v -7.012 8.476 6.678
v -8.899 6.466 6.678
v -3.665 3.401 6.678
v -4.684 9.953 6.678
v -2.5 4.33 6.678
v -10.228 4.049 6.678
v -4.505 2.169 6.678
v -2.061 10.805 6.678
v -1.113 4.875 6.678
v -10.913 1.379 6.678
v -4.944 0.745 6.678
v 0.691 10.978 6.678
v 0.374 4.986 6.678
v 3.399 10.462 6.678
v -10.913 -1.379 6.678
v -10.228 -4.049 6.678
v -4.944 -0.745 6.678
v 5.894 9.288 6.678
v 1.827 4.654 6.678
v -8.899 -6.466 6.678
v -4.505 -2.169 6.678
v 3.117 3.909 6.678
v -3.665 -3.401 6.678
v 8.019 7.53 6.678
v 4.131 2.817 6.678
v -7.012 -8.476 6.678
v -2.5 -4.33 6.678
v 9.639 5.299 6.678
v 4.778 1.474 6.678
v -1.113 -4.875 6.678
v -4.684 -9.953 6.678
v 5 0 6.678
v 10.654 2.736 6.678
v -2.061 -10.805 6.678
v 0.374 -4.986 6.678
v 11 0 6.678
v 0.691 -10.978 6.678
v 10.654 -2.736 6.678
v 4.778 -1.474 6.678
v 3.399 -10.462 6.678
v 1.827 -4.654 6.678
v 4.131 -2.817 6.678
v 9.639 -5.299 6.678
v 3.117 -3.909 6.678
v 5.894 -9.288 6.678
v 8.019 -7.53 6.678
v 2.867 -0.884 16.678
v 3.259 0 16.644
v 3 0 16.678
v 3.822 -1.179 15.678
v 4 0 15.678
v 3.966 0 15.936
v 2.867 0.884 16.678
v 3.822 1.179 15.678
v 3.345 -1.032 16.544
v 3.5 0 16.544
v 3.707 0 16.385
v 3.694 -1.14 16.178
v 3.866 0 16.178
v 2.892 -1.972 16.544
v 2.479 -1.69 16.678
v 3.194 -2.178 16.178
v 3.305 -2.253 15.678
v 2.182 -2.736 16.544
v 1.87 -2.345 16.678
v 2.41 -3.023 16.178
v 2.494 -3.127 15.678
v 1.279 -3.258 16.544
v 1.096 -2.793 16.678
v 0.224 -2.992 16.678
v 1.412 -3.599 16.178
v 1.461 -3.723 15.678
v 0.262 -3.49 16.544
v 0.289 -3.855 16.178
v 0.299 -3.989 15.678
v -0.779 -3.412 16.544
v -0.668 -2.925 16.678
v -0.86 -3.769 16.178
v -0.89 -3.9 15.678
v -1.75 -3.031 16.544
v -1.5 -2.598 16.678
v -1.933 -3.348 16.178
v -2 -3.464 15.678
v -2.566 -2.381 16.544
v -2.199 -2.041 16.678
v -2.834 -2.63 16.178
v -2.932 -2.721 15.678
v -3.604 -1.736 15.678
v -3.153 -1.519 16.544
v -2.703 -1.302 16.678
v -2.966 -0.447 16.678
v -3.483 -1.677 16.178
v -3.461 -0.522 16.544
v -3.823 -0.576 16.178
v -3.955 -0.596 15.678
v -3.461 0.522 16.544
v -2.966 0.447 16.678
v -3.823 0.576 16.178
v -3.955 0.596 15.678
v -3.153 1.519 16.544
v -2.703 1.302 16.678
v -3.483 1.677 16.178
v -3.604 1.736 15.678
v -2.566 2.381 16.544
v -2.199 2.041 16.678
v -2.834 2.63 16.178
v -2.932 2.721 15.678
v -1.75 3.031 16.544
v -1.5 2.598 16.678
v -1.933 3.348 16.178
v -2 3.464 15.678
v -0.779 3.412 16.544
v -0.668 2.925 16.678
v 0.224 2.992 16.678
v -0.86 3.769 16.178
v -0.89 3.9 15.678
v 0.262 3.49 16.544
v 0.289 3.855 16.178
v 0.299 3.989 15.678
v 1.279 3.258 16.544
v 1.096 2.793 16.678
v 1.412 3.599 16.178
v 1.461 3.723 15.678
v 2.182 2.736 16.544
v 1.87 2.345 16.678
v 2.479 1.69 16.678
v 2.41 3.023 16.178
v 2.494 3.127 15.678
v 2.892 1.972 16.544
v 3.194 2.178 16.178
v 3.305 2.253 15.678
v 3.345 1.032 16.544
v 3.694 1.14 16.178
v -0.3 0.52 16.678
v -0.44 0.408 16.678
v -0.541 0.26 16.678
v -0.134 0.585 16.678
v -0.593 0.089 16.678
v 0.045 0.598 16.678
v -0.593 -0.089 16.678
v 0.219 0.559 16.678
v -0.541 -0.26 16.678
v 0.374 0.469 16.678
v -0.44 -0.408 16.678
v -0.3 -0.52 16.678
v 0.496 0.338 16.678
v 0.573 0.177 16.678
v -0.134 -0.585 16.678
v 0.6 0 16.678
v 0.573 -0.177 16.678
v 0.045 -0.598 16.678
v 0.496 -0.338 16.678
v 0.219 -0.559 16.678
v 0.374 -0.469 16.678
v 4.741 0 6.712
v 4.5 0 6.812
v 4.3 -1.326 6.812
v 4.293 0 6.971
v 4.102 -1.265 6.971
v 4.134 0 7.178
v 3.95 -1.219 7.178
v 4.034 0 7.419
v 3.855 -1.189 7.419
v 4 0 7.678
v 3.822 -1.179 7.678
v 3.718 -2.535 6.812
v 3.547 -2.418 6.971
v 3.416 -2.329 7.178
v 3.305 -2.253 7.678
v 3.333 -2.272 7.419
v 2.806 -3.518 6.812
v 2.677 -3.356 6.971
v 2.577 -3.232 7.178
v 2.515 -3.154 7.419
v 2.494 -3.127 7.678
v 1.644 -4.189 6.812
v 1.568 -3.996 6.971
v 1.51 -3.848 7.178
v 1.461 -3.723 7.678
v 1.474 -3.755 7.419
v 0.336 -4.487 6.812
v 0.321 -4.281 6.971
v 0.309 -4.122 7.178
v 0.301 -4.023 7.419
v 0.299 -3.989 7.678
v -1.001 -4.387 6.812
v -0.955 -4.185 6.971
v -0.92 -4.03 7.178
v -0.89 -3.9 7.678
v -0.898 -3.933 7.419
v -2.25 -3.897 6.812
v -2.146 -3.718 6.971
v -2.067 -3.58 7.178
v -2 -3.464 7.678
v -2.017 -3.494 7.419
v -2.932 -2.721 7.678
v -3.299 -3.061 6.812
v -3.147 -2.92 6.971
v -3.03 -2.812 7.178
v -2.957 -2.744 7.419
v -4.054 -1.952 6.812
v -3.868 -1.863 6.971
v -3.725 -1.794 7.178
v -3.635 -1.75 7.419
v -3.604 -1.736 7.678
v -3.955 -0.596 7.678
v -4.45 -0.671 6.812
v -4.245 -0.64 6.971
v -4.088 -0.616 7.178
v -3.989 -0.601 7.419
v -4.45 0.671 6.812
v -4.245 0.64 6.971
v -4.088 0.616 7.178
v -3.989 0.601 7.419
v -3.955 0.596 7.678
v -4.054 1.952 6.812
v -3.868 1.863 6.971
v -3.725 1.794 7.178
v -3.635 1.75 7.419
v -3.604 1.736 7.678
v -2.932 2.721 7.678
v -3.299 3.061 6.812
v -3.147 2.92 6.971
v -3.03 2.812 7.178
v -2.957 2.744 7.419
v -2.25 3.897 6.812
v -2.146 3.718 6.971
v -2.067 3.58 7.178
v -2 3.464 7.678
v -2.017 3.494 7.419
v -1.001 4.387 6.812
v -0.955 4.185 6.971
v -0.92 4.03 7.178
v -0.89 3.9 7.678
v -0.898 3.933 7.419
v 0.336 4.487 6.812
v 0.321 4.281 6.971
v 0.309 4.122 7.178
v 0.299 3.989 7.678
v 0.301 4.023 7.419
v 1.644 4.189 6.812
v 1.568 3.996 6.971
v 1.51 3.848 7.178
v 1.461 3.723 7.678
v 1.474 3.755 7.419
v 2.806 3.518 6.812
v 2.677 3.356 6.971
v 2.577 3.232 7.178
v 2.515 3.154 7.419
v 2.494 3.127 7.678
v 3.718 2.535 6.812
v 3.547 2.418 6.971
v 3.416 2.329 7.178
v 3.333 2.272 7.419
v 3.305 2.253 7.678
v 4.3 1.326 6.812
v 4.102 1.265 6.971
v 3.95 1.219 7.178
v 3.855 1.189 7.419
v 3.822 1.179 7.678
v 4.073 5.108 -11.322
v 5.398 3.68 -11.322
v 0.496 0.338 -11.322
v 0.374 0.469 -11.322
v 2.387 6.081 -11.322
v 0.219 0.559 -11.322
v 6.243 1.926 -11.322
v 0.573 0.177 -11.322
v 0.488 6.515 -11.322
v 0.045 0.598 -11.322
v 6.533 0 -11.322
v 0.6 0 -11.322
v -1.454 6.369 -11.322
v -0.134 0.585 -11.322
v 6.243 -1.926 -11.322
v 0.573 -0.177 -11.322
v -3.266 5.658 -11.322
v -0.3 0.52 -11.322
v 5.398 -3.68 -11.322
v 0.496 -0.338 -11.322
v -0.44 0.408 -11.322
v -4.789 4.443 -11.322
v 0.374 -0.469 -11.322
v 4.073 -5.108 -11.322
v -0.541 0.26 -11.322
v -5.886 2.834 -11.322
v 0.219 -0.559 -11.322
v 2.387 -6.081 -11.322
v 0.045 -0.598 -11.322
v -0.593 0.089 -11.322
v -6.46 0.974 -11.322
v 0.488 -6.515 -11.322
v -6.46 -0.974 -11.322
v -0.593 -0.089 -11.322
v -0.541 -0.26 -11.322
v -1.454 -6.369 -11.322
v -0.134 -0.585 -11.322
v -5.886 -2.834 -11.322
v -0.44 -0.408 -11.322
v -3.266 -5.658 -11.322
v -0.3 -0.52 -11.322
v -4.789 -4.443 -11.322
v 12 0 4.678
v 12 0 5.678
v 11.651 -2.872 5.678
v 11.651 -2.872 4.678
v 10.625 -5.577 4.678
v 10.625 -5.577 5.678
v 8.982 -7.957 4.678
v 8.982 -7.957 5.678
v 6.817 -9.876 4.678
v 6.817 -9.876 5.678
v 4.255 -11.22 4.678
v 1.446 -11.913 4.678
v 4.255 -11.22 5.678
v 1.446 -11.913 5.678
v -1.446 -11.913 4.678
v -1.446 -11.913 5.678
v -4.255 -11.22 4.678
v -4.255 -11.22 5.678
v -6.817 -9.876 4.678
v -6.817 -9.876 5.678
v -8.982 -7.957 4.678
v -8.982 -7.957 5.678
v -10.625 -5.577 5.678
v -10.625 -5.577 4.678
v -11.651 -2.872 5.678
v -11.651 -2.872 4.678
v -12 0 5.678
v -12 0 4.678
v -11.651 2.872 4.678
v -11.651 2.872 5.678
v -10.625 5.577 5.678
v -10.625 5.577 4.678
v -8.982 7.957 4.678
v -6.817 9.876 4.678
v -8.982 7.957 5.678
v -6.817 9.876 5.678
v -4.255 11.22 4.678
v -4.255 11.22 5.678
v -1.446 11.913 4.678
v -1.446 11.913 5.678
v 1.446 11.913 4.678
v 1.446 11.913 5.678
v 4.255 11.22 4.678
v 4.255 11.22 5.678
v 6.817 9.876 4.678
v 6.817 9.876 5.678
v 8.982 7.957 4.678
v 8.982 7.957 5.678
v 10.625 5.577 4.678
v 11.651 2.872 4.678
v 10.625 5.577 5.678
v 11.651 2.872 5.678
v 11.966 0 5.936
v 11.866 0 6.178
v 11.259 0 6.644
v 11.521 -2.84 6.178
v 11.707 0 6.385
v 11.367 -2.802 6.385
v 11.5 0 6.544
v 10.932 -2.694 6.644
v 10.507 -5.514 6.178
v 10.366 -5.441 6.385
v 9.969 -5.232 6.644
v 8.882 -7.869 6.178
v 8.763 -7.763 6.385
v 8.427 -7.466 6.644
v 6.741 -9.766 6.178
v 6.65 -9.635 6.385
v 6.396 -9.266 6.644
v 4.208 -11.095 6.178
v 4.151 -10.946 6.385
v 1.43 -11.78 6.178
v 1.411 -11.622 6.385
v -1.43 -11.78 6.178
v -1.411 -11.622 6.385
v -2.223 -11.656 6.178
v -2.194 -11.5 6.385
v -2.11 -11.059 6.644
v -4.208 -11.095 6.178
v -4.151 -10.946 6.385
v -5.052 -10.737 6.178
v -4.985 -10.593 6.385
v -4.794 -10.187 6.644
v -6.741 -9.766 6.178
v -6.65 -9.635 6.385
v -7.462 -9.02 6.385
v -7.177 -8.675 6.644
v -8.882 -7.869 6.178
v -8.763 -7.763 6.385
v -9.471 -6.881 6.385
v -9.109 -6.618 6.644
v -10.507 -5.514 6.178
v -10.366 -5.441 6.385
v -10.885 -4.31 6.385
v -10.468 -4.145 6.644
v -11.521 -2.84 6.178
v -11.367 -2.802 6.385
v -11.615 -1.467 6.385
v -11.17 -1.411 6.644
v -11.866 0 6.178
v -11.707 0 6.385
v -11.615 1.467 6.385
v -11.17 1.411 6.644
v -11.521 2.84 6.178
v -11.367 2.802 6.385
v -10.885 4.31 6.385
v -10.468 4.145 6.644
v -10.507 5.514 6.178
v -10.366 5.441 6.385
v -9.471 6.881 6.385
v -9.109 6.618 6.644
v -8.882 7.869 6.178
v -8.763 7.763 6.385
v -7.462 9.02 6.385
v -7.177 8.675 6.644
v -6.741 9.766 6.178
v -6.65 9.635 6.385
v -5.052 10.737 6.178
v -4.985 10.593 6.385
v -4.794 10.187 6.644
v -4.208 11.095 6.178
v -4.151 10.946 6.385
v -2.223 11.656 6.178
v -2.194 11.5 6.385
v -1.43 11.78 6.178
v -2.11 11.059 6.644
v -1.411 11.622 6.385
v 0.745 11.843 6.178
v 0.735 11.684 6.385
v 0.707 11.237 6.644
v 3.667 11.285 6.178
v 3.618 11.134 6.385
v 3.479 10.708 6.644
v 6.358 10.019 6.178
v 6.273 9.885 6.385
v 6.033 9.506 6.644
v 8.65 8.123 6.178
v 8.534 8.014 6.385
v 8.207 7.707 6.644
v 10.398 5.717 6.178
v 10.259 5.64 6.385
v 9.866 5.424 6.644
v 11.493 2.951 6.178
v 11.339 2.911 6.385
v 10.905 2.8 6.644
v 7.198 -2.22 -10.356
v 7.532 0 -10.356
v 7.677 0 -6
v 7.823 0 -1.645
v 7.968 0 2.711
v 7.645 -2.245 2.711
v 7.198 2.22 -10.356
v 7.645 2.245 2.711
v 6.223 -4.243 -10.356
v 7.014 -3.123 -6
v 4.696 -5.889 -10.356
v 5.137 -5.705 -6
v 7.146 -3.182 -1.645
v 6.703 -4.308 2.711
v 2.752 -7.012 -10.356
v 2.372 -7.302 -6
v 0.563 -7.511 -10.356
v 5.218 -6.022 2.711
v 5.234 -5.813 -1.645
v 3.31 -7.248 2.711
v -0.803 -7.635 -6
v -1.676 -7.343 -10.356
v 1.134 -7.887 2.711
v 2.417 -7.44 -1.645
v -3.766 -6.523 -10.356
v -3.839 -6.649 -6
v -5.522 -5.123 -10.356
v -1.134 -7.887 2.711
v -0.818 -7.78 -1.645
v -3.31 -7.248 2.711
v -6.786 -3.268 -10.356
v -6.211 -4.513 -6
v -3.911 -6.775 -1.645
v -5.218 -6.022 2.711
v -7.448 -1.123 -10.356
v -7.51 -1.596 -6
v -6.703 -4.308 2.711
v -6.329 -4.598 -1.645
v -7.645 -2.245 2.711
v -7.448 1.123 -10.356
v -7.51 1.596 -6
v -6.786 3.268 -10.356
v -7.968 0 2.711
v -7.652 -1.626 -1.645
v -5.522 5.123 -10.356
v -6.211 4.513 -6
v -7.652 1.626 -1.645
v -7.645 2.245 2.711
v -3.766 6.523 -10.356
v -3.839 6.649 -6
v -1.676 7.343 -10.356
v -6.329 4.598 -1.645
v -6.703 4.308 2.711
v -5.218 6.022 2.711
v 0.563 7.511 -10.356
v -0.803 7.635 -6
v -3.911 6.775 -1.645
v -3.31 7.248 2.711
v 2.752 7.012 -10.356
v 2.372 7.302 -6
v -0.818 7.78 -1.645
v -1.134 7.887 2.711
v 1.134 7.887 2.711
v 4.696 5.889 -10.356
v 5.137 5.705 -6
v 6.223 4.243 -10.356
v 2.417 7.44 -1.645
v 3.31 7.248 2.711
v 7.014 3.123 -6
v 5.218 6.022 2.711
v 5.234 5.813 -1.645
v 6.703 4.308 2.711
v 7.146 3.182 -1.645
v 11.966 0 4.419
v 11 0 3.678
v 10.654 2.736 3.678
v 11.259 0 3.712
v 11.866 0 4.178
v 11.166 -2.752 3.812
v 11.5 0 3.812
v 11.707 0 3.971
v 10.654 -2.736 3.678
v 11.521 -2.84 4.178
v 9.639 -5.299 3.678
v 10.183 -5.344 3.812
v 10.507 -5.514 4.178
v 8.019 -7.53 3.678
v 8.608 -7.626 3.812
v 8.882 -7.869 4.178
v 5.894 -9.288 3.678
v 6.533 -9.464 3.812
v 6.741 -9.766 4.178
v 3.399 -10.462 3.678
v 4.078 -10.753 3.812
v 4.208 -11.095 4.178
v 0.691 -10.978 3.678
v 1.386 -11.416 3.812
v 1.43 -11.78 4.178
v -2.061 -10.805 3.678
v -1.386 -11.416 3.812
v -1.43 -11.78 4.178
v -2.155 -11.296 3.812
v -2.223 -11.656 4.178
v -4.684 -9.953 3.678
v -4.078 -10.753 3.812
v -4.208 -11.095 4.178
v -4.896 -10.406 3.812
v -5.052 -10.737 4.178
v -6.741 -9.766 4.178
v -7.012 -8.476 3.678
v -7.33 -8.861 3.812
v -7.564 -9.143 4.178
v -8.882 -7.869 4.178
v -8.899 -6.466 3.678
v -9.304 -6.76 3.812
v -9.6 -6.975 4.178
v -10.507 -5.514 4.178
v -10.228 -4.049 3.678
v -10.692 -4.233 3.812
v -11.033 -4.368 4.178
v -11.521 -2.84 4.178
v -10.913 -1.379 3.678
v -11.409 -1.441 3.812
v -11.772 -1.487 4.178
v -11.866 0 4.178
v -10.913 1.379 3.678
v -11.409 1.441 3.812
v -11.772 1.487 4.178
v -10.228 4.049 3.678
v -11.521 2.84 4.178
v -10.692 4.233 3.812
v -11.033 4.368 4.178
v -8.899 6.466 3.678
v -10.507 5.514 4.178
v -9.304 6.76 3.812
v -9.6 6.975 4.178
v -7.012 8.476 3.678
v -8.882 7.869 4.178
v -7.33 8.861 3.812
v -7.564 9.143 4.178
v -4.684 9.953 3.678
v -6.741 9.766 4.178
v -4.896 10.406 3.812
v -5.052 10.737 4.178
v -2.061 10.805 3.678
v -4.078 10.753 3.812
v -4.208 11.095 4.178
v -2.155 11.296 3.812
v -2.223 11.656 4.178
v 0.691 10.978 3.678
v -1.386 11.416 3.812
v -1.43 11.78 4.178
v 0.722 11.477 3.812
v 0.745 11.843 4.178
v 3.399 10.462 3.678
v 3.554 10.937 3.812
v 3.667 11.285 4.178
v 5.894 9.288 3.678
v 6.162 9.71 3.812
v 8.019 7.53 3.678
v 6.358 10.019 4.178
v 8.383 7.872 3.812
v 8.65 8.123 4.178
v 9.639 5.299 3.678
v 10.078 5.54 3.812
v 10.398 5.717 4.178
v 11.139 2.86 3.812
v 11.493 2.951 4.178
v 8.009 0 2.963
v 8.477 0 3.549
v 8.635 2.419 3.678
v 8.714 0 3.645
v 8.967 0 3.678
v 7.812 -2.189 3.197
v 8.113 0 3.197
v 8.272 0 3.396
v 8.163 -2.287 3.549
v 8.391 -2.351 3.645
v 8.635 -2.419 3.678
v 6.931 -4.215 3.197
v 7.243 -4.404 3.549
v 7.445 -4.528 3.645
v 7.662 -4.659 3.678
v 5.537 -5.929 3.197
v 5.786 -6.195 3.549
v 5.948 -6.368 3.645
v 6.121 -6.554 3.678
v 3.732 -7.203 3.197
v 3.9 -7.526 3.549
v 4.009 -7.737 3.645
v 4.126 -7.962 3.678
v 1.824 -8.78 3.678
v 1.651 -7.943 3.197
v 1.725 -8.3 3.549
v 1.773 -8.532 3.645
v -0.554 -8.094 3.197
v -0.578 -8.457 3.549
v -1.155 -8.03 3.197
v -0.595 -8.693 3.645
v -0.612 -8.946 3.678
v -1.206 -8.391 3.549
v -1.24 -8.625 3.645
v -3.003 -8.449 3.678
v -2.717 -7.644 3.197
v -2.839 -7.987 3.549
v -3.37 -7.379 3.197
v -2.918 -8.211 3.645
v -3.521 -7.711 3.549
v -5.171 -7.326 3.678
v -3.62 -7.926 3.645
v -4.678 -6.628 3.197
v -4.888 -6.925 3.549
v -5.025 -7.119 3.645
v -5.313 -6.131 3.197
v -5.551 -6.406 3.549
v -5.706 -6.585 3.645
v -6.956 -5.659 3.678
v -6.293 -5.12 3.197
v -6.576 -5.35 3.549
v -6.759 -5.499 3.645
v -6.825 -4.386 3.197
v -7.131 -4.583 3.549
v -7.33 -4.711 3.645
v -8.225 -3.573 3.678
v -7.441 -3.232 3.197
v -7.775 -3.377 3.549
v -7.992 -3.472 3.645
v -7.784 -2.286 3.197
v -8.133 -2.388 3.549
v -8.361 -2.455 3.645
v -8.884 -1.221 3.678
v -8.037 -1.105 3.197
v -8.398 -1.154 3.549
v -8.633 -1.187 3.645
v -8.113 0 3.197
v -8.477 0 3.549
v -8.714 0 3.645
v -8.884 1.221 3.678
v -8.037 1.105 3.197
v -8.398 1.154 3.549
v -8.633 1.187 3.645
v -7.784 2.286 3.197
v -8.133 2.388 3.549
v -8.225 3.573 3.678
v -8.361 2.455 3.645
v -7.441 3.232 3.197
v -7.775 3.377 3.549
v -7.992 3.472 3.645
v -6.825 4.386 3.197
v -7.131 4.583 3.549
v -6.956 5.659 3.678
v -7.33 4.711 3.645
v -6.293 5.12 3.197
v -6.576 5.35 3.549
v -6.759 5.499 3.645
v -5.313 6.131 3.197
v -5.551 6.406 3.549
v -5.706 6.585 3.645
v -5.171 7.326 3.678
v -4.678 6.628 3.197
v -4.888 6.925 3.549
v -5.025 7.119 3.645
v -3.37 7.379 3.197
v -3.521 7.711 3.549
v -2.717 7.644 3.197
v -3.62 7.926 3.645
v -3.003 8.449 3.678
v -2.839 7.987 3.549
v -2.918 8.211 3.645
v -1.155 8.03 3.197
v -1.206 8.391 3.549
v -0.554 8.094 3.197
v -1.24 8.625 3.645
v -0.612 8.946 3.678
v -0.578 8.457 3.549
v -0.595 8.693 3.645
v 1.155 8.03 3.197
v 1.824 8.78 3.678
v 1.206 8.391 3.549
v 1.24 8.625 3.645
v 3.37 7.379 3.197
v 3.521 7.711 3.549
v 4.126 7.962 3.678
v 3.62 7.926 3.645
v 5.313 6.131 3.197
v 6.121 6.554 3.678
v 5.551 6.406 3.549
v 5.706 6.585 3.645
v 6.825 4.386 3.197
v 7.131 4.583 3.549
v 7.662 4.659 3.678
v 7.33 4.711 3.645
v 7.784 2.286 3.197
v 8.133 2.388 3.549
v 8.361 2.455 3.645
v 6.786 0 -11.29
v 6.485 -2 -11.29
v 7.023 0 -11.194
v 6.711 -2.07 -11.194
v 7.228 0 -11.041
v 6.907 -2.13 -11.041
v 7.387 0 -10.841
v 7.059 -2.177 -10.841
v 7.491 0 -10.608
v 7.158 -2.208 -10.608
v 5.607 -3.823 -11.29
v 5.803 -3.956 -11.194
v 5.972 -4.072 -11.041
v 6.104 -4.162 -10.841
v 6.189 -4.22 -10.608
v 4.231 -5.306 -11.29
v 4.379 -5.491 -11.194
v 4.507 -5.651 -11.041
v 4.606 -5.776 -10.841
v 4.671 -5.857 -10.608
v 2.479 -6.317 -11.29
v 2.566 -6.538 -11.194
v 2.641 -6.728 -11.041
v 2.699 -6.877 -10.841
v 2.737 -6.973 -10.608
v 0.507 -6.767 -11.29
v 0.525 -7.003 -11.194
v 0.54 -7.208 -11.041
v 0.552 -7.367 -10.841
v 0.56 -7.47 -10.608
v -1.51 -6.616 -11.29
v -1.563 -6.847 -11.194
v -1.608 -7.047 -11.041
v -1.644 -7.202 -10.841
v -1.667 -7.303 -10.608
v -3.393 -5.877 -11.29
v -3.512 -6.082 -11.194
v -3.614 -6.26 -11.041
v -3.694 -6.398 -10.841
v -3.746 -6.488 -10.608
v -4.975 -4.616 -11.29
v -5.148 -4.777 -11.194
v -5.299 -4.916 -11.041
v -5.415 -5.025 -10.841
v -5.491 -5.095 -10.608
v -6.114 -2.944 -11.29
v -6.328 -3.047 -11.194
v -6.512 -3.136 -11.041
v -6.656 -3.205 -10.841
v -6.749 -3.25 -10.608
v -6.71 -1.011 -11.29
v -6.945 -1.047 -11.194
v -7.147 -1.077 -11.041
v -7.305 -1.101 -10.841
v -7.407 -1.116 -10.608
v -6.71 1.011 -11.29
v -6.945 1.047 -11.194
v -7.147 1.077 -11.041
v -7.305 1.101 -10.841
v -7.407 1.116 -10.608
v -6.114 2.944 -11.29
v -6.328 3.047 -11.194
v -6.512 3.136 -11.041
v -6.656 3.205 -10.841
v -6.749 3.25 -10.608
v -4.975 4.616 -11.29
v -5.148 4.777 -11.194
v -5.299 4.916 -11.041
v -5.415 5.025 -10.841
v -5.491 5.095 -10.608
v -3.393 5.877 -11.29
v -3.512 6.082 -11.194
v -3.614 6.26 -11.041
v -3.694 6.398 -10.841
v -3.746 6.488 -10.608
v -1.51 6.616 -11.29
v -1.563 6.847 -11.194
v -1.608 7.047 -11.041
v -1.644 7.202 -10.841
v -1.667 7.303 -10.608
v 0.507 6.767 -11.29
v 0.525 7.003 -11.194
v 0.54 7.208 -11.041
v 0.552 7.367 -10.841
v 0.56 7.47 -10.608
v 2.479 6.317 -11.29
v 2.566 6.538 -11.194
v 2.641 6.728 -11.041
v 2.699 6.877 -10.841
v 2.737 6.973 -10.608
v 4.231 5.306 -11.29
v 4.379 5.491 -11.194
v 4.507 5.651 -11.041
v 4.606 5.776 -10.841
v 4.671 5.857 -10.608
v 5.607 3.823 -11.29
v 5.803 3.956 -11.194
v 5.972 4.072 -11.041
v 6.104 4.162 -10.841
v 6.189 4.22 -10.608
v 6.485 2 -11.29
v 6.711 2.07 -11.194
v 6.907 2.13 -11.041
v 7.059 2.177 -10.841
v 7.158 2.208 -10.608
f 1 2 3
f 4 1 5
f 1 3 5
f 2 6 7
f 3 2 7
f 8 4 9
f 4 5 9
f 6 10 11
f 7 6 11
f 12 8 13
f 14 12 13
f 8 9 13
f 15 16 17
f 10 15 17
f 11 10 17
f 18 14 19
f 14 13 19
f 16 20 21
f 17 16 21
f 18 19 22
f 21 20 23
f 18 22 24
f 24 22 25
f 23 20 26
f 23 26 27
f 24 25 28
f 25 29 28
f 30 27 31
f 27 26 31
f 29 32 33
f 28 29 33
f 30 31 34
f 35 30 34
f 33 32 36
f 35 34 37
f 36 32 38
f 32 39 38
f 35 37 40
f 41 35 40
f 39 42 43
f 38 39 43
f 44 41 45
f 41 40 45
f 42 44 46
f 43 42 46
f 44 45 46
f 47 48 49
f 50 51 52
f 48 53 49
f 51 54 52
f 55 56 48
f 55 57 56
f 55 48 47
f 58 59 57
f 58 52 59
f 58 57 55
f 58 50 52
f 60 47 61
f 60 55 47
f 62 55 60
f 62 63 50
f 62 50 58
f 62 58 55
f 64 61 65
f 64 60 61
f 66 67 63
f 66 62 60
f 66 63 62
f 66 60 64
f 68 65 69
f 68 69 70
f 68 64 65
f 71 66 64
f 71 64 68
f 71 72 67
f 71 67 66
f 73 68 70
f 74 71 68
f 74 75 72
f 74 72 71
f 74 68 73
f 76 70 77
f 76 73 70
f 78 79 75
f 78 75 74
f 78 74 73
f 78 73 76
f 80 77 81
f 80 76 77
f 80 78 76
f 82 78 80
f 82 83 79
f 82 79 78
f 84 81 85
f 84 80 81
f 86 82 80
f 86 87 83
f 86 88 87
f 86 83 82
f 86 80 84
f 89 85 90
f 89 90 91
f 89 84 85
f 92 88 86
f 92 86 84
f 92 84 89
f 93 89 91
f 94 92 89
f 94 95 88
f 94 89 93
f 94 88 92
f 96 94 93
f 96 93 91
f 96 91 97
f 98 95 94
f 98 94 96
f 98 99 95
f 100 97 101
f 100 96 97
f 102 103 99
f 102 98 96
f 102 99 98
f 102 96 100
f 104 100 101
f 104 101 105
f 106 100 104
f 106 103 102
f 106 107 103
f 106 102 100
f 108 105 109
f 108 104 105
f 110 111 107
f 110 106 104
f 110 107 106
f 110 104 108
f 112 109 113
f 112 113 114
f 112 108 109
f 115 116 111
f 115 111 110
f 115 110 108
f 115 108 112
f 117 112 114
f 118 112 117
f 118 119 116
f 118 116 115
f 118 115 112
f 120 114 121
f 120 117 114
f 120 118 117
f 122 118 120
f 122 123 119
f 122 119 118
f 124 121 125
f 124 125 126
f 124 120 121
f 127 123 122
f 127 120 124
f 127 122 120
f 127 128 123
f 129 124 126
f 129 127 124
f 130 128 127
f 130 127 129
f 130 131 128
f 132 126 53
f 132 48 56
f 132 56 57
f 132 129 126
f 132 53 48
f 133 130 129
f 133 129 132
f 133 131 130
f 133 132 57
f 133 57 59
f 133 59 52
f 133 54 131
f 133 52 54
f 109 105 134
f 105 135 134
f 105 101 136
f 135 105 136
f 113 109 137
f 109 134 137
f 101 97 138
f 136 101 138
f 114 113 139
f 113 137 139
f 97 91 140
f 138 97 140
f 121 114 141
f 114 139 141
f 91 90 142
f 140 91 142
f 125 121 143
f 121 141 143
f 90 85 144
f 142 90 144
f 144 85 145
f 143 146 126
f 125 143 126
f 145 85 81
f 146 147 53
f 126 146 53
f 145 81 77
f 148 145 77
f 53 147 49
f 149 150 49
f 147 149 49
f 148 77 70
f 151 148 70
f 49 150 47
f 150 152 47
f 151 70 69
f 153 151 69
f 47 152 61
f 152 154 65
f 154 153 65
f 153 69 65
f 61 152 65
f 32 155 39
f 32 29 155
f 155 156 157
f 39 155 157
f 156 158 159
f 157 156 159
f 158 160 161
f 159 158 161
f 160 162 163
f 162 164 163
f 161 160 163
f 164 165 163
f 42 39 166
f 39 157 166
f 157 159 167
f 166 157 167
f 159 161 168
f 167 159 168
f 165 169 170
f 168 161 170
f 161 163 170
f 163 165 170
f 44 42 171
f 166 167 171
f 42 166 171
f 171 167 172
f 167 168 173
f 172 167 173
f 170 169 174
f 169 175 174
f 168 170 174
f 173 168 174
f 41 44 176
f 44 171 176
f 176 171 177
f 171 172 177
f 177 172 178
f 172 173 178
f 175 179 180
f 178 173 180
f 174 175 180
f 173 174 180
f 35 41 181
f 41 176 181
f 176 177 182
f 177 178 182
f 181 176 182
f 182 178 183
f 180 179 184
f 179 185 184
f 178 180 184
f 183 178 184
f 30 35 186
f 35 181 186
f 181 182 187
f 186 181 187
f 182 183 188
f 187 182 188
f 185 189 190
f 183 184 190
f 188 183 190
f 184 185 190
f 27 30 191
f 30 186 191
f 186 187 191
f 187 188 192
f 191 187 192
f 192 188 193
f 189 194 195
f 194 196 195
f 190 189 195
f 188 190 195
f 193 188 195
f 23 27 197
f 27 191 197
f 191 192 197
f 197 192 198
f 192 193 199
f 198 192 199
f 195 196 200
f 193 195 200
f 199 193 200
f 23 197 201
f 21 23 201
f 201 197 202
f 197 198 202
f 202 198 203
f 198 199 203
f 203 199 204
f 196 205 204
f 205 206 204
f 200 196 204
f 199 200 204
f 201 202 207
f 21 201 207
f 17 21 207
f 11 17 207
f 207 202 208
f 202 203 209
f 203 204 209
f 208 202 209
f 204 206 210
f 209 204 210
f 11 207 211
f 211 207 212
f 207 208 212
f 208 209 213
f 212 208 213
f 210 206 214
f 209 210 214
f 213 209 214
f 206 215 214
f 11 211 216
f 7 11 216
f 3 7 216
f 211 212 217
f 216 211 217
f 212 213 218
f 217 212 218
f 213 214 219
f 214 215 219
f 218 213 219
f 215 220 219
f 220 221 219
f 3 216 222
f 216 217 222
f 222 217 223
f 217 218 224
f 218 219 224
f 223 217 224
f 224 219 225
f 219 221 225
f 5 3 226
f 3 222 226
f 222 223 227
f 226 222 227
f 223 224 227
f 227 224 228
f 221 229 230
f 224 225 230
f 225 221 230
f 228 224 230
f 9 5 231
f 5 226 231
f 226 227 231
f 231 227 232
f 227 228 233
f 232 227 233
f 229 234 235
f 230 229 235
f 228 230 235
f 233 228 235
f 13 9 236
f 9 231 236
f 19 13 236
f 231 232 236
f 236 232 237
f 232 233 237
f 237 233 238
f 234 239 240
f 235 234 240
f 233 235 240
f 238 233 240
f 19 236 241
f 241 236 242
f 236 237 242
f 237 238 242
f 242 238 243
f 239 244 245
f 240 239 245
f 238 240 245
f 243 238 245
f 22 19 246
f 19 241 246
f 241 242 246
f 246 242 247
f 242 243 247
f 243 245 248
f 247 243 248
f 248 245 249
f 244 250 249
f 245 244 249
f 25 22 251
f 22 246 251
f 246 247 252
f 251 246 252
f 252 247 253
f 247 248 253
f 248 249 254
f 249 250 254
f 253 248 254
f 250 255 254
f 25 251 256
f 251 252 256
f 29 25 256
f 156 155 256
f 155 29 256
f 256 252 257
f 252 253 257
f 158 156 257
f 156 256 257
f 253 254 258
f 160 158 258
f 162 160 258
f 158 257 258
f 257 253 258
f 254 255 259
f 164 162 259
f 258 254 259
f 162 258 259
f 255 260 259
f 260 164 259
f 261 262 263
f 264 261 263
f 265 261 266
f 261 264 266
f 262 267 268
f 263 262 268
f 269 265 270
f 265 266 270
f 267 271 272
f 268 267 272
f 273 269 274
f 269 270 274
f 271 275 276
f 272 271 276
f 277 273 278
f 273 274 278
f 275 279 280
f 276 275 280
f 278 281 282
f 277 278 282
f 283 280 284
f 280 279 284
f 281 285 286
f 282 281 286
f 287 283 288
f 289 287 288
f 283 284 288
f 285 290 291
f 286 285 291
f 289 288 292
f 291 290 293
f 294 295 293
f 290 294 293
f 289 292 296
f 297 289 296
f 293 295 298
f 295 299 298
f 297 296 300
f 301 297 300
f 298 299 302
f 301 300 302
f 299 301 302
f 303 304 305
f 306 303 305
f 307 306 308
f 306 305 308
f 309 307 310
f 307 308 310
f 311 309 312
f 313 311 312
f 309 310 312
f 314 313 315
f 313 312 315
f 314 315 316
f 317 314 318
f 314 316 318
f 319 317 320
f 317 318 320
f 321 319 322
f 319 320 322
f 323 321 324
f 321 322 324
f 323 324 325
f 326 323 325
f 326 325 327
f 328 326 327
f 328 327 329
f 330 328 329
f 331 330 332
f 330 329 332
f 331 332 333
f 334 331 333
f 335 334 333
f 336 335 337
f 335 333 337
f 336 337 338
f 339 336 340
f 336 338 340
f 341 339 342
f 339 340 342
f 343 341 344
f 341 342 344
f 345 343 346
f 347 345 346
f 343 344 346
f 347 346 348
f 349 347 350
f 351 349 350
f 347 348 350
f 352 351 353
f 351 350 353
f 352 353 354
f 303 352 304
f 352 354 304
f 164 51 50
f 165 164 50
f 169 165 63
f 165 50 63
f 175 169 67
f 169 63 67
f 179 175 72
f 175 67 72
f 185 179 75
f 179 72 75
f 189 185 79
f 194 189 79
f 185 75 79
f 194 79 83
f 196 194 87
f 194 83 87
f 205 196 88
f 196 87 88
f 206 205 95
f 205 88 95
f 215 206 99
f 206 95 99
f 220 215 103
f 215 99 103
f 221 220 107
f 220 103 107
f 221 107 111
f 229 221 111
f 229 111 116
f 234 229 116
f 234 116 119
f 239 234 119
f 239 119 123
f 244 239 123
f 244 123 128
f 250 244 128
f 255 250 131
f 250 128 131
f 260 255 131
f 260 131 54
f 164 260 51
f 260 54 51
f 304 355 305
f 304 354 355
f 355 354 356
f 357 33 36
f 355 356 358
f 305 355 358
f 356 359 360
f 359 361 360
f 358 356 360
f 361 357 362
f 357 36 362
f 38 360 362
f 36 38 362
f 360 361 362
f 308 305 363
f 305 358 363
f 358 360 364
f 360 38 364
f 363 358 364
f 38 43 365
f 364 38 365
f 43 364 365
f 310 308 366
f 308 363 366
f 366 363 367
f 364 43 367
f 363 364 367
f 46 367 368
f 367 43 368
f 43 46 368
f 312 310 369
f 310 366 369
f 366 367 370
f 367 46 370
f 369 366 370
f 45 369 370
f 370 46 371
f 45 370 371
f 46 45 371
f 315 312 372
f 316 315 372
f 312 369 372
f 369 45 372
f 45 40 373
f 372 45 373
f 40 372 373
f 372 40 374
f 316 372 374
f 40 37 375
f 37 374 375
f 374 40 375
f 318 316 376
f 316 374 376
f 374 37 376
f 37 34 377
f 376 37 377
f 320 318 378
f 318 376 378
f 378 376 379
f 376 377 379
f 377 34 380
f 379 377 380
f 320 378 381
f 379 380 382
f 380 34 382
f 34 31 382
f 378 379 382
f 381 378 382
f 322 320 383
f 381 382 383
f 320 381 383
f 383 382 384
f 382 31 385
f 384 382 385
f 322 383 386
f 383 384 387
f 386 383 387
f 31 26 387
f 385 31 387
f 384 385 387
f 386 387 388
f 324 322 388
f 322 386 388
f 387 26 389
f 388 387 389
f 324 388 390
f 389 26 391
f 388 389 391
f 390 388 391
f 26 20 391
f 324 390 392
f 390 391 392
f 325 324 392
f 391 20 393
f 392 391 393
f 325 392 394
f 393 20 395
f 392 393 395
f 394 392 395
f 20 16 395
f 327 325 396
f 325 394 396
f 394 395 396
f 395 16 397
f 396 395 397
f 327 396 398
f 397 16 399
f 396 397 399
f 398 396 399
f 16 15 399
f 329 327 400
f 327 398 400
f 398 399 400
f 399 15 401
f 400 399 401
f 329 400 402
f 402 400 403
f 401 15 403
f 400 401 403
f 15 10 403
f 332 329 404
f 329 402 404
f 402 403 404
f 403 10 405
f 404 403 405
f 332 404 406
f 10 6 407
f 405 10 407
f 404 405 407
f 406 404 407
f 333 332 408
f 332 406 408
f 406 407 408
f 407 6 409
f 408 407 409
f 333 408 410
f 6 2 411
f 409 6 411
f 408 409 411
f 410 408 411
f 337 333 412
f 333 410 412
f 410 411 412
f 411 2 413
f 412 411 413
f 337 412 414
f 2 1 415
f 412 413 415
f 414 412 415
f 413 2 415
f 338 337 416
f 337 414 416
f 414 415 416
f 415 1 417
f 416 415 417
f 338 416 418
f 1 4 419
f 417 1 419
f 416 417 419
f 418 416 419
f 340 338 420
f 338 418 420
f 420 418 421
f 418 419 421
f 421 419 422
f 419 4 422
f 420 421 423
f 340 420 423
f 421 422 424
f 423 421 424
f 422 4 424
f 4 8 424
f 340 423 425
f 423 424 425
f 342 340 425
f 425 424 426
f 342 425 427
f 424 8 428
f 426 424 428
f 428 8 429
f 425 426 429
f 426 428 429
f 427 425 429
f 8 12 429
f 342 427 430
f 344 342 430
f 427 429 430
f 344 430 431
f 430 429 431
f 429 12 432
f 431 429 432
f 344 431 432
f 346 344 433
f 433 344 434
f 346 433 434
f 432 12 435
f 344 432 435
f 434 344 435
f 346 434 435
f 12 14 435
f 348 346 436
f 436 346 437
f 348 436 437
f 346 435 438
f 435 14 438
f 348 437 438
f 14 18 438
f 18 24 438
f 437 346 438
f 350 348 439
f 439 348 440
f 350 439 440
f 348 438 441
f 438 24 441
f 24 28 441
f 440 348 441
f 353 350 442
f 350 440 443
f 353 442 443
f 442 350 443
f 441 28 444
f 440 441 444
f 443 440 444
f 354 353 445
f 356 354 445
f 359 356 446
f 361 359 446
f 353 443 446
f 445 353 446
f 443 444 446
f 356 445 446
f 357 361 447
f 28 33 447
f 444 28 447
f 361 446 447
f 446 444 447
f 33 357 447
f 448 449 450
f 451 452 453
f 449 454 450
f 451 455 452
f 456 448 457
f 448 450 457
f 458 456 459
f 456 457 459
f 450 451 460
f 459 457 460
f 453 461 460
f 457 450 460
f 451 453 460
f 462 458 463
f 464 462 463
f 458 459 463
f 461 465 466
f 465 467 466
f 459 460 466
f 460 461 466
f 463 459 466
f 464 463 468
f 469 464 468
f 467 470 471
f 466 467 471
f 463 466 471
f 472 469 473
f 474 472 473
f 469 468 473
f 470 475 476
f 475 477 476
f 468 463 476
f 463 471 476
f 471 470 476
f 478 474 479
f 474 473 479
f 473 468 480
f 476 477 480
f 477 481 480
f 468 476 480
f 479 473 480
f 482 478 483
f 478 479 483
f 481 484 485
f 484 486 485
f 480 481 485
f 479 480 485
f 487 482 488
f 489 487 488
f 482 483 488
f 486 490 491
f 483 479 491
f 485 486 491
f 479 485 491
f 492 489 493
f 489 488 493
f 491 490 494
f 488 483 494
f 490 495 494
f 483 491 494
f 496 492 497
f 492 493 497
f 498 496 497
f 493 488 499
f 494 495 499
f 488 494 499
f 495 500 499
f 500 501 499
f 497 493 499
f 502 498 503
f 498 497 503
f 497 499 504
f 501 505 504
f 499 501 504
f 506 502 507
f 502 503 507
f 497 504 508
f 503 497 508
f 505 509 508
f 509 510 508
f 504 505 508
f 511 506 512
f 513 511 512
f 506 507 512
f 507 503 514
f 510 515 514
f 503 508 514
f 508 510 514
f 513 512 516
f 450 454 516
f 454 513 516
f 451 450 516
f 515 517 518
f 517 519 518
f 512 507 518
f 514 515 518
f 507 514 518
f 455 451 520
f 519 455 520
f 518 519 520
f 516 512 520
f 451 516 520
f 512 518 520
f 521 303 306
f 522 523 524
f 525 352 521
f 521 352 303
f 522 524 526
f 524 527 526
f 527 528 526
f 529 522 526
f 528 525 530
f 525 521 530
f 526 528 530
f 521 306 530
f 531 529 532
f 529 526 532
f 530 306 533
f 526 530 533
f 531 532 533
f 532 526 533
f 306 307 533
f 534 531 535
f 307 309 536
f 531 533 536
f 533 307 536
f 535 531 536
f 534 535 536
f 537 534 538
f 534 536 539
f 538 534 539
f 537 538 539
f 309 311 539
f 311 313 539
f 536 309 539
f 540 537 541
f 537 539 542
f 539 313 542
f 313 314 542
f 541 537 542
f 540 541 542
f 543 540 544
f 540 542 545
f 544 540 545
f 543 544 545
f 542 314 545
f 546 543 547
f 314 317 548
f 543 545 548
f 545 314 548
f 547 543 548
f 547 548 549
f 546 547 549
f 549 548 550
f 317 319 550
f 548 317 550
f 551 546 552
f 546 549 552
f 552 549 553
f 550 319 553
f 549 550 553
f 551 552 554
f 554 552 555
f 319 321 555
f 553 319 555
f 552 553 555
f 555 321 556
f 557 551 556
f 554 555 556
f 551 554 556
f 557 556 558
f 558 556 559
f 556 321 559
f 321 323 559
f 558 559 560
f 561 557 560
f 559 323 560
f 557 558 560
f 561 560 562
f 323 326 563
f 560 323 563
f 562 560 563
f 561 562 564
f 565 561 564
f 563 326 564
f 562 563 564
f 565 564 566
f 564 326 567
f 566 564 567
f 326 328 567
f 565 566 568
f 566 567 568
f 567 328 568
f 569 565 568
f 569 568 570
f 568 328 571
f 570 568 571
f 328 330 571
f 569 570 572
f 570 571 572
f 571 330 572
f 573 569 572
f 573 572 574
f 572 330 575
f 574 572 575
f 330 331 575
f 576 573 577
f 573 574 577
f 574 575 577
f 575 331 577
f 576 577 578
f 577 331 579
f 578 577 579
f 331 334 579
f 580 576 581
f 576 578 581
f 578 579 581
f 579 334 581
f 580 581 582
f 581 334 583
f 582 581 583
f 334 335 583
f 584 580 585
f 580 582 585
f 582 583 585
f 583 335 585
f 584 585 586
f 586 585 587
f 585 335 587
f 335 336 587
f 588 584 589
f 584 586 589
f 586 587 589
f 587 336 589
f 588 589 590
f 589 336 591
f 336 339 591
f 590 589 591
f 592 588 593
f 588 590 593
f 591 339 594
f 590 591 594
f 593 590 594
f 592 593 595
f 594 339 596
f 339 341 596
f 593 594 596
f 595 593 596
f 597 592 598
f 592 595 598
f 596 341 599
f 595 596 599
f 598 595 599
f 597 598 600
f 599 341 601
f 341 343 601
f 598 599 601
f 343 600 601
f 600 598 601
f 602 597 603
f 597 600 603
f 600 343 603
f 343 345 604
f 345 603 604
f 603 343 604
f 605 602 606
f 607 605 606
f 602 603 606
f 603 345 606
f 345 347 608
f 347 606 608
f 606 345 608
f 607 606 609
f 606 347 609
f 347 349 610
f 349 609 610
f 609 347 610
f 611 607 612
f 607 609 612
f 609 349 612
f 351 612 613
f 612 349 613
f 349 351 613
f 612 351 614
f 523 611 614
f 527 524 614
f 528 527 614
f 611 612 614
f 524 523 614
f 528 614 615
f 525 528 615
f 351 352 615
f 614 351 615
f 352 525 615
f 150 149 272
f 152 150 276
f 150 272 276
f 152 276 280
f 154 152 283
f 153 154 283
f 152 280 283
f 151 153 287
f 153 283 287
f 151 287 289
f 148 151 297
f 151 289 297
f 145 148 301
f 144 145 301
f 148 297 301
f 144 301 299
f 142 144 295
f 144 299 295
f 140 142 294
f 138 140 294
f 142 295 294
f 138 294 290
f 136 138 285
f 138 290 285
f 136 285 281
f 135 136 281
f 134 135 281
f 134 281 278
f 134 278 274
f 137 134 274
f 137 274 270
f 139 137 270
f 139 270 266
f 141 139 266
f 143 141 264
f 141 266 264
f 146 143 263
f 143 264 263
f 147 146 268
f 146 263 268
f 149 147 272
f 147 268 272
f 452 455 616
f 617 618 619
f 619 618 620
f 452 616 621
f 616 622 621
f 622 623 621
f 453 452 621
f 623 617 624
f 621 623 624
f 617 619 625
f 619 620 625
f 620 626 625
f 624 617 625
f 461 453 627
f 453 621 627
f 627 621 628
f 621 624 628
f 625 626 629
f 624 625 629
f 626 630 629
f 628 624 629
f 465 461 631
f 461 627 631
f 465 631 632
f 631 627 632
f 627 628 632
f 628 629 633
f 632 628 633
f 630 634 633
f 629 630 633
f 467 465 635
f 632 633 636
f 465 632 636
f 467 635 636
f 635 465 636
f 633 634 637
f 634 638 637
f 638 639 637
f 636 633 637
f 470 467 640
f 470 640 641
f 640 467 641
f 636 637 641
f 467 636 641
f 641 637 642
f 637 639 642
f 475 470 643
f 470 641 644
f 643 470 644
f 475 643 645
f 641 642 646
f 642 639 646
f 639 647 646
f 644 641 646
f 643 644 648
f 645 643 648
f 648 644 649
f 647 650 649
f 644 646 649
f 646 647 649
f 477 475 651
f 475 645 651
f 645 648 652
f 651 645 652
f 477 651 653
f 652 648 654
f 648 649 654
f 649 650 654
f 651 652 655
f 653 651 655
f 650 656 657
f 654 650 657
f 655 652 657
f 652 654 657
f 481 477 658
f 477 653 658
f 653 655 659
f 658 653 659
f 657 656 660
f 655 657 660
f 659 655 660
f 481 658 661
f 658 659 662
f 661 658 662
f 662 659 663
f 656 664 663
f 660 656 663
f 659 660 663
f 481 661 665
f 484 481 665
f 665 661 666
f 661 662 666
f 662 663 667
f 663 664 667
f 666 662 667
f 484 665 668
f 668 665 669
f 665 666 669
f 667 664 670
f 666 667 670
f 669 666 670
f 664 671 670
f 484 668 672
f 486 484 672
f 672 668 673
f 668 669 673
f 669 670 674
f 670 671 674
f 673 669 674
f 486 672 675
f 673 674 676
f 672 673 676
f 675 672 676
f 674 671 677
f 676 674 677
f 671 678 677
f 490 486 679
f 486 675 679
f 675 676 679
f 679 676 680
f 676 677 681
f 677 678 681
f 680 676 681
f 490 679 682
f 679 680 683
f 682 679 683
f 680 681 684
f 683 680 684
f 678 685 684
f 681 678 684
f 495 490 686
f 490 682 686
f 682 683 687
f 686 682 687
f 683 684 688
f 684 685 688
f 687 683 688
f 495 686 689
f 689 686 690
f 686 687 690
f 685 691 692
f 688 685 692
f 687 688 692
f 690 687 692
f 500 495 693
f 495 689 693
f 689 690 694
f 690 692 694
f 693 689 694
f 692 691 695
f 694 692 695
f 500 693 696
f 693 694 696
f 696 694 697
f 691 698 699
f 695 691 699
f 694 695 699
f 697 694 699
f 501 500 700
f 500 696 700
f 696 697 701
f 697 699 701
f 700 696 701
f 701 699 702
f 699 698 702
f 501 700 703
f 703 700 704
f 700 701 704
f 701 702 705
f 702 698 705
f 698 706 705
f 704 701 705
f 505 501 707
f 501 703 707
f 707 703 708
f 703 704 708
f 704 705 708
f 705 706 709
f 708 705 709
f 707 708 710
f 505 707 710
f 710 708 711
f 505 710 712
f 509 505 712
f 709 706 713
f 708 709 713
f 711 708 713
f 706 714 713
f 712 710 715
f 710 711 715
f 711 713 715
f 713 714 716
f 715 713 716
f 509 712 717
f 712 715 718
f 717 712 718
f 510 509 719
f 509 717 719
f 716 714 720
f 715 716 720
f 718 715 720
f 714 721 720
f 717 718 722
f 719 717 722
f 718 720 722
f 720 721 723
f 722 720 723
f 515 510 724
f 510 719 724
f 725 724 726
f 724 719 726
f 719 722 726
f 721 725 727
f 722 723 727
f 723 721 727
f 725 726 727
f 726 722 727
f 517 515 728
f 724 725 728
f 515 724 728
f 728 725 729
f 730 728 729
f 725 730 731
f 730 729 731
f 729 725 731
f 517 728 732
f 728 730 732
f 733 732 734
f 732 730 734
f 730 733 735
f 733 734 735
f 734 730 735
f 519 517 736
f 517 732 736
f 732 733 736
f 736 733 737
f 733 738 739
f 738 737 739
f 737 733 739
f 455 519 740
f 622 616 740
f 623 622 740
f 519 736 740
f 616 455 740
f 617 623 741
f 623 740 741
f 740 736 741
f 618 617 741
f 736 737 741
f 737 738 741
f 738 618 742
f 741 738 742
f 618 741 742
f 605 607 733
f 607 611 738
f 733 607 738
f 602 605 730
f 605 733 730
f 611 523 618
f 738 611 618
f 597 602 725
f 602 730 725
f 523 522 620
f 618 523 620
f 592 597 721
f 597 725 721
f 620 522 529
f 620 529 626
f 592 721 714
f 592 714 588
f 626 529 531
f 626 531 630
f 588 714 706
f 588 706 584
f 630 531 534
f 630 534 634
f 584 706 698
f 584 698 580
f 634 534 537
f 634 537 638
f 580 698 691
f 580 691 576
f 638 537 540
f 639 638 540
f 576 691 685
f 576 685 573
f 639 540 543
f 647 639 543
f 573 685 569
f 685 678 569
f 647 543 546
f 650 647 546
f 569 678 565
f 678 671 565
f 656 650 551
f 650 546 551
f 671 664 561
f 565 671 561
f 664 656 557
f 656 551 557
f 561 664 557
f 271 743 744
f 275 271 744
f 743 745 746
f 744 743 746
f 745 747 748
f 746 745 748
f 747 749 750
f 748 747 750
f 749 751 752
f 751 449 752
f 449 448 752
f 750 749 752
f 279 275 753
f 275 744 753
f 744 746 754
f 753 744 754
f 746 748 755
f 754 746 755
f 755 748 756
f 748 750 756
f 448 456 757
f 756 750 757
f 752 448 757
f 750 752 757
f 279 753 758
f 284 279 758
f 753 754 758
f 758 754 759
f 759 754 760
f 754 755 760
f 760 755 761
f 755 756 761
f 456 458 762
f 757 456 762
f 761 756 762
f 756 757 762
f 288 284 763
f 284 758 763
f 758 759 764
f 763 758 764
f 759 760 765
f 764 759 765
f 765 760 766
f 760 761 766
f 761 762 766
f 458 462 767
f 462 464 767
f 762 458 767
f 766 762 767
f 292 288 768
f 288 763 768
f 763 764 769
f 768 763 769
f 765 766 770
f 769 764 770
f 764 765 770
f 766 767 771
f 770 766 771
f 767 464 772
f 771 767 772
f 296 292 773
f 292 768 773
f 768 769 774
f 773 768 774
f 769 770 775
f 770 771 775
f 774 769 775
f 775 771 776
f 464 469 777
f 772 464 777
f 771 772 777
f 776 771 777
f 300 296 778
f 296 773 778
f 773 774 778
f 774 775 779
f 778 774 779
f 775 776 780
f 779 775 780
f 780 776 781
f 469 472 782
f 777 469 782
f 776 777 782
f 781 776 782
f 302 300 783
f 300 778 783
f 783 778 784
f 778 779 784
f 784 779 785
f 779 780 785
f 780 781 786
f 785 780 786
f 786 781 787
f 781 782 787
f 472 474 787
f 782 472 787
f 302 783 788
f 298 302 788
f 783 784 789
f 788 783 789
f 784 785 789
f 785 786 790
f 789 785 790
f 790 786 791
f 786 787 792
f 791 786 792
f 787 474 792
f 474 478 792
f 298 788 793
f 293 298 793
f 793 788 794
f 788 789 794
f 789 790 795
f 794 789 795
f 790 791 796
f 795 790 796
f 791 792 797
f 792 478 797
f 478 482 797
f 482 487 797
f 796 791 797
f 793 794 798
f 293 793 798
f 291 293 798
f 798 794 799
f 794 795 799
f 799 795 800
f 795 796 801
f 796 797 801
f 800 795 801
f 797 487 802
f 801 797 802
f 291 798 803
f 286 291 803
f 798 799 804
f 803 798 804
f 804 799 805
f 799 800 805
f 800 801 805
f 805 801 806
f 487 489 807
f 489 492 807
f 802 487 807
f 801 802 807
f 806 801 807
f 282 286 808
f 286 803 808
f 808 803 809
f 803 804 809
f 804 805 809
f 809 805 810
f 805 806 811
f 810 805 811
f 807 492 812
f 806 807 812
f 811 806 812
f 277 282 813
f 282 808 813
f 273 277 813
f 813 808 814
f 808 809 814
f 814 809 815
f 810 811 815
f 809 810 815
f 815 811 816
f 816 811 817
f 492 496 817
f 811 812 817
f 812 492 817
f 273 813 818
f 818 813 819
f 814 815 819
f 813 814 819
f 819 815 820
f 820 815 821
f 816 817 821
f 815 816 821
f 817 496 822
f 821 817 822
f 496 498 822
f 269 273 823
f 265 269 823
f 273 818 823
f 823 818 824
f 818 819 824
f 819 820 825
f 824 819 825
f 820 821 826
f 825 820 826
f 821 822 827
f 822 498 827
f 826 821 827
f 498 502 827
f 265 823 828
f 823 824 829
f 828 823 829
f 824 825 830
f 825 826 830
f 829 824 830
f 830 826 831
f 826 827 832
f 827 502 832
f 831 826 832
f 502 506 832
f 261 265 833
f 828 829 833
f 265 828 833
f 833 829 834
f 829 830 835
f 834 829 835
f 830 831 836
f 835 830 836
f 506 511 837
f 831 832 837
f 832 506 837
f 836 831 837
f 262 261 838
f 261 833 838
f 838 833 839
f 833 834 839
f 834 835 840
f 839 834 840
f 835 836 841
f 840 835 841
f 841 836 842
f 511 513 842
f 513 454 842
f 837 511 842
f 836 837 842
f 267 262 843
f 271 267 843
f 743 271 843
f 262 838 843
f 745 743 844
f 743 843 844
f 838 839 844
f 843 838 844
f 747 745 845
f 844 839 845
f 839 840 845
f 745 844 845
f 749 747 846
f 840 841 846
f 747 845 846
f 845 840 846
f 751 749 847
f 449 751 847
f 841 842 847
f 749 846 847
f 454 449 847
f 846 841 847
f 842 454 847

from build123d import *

# Parameters (mm, degrees)
F2_R = 1


with BuildPart() as f1:
    # F0 (on Front) → F1 (revolve)
    with BuildSketch(Plane.XZ):
        Polygon((4, 16.67762), (0.6, 16.67762), (0.6, -11.32238), (7.5, -11.32238), (8, 3.67762), (12, 3.67762), (12, 6.67762), (4, 6.67762), align=None)
    revolve(axis=Axis((0, 0, 0.295774), (0, 0, -1)))

    # F2
    f2_edges = [f1.edges().sort_by_distance(p)[0] for p in [
        (-7.5, 0, -11.32238),
        (-8, 0, 3.67762),
        (-12, 0, 3.67762),
        (-12, 0, 6.67762),
        (-4, 0, 16.67762),
        (-4, 0, 6.67762),
    ]]
    fillet(f2_edges, radius=F2_R)


solid = f1.part
